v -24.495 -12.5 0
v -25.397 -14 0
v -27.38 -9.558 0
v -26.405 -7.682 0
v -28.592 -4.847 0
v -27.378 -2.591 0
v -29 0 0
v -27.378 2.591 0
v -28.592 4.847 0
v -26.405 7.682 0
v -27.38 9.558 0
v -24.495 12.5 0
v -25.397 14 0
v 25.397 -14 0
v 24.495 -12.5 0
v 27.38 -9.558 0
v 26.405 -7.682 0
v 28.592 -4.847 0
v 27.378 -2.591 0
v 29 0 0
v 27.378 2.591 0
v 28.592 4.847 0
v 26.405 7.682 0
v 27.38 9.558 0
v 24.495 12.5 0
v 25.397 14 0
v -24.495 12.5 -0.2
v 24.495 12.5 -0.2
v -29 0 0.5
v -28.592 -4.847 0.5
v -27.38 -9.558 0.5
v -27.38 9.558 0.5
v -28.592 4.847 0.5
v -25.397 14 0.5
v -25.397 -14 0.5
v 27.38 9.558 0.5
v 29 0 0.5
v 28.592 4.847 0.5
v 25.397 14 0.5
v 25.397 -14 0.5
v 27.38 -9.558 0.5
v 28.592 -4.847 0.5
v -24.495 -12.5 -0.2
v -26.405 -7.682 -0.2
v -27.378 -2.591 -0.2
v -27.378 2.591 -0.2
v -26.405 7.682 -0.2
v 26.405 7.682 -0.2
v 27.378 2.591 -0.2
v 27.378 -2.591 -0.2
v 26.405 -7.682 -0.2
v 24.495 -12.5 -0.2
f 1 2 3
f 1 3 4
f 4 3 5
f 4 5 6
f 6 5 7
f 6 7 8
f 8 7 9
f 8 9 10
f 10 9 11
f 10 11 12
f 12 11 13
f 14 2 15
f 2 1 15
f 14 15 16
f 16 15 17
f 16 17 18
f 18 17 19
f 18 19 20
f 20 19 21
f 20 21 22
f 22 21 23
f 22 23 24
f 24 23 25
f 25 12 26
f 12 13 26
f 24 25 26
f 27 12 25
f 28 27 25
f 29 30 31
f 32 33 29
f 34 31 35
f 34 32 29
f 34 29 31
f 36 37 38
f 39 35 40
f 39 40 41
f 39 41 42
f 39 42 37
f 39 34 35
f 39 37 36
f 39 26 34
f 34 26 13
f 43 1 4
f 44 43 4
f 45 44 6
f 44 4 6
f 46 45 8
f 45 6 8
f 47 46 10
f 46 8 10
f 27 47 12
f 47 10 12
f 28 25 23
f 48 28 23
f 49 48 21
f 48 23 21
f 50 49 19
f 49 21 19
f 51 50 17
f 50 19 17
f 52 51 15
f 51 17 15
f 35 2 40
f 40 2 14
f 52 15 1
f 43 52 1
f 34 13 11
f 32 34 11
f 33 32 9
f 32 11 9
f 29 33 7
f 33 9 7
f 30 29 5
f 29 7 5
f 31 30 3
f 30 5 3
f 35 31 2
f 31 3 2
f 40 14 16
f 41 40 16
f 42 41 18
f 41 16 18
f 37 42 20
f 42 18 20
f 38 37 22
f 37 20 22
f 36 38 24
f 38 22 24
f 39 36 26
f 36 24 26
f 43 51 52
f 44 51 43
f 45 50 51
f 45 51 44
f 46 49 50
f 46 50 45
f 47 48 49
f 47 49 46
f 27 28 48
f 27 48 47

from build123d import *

# Parameters (mm, degrees)
EXTRUDE_1_DEPTH = 0.5
EXTRUDE_2_DEPTH = 0.2


with BuildPart() as part:
    # Эскиз1 → Бобышка-Вытянуть1 (new body)
    with BuildSketch(Plane.XY):
        with BuildLine():
            Line((25.396850198, 14), (-25.396850198, 14))
            ThreePointArc((-25.396850198, 14), (-29, 0), (-25.396850198, -14))
            Line((-25.396850198, -14), (25.396850198, -14))
            ThreePointArc((25.396850198, -14), (29, 0), (25.396850198, 14))
        make_face()
    extrude(amount=EXTRUDE_1_DEPTH)

    # Эскиз2 → Бобышка-Вытянуть2 (add)
    with BuildSketch(Plane(origin=(0, 0, 0), x_dir=(-1, 0, 0), z_dir=(0, 0, -1))):
        with BuildLine():
            Line((-24.494897428, -12.5), (24.494897428, -12.5))
            ThreePointArc((24.494897428, -12.5), (27.5, 0), (24.494897428, 12.5))
            Line((24.494897428, 12.5), (-24.494897428, 12.5))
            ThreePointArc((-24.494897428, 12.5), (-27.5, 0), (-24.494897428, -12.5))
        make_face()
    extrude(amount=EXTRUDE_2_DEPTH)


solid = part.part
